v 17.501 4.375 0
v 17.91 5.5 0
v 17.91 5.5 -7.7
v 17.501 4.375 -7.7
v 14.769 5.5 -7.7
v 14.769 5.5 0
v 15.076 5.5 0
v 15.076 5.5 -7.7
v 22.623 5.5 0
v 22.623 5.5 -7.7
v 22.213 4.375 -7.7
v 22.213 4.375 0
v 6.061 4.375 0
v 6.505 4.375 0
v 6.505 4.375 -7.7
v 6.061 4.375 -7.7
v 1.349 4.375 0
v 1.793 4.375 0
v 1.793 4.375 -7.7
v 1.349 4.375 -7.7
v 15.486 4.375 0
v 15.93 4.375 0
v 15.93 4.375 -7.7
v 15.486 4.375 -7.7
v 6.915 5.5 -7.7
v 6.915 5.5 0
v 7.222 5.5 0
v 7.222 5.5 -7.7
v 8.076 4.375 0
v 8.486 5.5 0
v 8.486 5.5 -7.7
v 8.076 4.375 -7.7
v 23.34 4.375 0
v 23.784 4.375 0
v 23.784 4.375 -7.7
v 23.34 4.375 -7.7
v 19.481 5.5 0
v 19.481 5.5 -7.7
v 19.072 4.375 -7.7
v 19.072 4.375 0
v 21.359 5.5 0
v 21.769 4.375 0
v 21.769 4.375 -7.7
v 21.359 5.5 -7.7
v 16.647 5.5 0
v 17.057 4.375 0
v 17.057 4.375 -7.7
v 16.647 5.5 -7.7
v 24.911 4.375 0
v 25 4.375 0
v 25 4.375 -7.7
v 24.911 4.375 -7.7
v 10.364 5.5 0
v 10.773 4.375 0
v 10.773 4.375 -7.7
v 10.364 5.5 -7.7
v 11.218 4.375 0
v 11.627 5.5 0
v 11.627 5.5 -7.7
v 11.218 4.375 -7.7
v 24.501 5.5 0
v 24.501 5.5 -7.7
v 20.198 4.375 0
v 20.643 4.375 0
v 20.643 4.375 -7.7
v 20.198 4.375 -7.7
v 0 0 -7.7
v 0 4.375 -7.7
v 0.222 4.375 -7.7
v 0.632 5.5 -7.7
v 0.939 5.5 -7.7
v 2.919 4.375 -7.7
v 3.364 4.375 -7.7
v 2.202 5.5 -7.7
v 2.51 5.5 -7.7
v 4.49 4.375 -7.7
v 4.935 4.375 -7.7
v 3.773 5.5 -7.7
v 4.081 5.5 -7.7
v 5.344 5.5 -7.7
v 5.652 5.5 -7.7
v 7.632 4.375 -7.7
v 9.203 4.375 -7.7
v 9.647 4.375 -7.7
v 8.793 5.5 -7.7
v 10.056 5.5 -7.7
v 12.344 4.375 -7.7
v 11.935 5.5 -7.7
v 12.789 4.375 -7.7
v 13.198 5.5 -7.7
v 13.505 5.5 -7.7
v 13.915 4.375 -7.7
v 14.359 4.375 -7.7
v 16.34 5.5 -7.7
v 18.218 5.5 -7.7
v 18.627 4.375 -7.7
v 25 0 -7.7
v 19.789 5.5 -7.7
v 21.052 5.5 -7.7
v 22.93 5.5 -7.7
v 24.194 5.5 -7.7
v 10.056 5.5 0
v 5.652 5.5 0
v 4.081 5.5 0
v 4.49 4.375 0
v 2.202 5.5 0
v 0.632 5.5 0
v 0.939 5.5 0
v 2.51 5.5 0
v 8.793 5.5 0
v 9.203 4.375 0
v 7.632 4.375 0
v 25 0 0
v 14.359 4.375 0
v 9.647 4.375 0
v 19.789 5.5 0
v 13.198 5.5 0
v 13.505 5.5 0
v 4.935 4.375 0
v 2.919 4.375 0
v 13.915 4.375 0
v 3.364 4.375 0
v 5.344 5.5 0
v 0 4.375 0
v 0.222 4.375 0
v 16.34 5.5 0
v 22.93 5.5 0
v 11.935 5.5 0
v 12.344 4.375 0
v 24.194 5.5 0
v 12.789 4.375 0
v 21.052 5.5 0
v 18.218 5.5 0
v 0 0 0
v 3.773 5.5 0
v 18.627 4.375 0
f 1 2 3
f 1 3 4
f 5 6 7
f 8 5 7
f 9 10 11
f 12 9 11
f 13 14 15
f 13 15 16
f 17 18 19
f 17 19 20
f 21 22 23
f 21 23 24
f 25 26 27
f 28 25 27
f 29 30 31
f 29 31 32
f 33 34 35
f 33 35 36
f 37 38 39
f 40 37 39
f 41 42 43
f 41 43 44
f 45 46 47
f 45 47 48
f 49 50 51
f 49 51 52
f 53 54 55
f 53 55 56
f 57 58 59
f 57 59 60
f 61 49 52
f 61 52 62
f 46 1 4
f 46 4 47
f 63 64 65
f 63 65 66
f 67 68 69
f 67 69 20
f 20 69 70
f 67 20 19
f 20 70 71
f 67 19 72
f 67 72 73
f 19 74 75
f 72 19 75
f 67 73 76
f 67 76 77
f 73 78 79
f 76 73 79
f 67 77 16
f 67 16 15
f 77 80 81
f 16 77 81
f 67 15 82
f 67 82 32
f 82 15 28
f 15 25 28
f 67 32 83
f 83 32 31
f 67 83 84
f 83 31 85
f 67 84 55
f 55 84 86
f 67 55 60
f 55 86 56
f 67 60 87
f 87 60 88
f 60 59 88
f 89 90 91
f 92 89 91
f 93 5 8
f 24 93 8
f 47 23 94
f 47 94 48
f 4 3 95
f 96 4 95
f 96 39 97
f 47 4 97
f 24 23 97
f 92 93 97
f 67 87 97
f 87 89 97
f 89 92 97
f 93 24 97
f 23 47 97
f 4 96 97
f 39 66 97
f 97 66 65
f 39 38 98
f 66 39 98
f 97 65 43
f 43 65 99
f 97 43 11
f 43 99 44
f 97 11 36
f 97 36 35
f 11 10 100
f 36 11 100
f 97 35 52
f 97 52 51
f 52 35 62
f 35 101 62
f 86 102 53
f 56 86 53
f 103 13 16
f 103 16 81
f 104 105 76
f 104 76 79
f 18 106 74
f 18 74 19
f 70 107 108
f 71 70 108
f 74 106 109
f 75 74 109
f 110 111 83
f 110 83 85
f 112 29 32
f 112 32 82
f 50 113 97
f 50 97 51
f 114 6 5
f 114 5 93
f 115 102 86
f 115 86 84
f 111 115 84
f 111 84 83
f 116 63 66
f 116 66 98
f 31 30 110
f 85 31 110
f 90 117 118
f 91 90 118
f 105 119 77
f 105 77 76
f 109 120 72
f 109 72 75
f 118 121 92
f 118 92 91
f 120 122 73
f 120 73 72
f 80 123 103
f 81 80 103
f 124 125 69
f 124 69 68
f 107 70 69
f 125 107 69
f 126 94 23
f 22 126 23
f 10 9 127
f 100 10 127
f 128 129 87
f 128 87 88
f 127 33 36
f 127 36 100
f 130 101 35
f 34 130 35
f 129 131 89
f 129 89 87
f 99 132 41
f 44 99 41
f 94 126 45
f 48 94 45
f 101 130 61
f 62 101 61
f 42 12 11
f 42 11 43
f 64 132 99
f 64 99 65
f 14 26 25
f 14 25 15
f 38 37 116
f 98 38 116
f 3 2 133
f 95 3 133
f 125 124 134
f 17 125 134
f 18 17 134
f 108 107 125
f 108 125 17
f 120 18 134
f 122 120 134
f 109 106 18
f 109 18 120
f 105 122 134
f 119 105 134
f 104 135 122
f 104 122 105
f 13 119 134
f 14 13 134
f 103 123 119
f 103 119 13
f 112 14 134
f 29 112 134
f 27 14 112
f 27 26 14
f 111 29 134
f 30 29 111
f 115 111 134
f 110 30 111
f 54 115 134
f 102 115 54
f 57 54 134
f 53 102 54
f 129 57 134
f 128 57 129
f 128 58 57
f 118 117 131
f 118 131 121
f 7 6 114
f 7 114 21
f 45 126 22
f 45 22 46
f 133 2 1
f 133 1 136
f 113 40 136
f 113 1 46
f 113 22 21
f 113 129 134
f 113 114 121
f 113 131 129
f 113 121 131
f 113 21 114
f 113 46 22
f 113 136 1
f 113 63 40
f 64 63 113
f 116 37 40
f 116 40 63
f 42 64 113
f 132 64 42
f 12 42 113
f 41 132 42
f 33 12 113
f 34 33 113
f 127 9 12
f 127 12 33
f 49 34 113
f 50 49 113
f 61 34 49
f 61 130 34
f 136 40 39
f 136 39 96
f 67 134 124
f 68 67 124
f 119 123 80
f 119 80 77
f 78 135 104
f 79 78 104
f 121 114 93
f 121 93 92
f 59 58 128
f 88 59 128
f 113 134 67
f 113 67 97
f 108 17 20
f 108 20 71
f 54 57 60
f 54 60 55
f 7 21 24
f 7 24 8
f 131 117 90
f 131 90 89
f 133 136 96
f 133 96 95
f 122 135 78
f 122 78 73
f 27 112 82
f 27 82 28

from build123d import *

# Parameters (mm, degrees)
BLANKSKE_W        = 25
BLANKSKE_H        = 5.5
BLANK_DEPTH       = 7.7
TOOTHCUTSIM_DEPTH = 27.730881018
TEETHCUTS_COUNT   = 17
TEETHCUTS_PITCH   = 1.570796325


with BuildPart() as part:
    # BlankSke → Blank (new body)
    with BuildSketch(Plane.XY):
        with Locations((12.5, 2.75)):
            Rectangle(BLANKSKE_W, BLANKSKE_H)
    extrude(amount=-BLANK_DEPTH)

    # TooCutSkeSim → ToothCutSim (cut, through all)
    with BuildSketch(Plane.XY):
        Polygon((0.222217685, 4.375), (-0.222217685, 4.375), (-0.640929042, 5.5254), (0.640929042, 5.5254), align=None)
    toothcutsim = extrude(amount=-TOOTHCUTSIM_DEPTH, mode=Mode.SUBTRACT)

    # TeethCuts: ToothCutSim ×17
    with Locations(*[(i * TEETHCUTS_PITCH, 0, 0) for i in range(1, TEETHCUTS_COUNT)]):
        add(toothcutsim, mode=Mode.SUBTRACT)


solid = part.part
